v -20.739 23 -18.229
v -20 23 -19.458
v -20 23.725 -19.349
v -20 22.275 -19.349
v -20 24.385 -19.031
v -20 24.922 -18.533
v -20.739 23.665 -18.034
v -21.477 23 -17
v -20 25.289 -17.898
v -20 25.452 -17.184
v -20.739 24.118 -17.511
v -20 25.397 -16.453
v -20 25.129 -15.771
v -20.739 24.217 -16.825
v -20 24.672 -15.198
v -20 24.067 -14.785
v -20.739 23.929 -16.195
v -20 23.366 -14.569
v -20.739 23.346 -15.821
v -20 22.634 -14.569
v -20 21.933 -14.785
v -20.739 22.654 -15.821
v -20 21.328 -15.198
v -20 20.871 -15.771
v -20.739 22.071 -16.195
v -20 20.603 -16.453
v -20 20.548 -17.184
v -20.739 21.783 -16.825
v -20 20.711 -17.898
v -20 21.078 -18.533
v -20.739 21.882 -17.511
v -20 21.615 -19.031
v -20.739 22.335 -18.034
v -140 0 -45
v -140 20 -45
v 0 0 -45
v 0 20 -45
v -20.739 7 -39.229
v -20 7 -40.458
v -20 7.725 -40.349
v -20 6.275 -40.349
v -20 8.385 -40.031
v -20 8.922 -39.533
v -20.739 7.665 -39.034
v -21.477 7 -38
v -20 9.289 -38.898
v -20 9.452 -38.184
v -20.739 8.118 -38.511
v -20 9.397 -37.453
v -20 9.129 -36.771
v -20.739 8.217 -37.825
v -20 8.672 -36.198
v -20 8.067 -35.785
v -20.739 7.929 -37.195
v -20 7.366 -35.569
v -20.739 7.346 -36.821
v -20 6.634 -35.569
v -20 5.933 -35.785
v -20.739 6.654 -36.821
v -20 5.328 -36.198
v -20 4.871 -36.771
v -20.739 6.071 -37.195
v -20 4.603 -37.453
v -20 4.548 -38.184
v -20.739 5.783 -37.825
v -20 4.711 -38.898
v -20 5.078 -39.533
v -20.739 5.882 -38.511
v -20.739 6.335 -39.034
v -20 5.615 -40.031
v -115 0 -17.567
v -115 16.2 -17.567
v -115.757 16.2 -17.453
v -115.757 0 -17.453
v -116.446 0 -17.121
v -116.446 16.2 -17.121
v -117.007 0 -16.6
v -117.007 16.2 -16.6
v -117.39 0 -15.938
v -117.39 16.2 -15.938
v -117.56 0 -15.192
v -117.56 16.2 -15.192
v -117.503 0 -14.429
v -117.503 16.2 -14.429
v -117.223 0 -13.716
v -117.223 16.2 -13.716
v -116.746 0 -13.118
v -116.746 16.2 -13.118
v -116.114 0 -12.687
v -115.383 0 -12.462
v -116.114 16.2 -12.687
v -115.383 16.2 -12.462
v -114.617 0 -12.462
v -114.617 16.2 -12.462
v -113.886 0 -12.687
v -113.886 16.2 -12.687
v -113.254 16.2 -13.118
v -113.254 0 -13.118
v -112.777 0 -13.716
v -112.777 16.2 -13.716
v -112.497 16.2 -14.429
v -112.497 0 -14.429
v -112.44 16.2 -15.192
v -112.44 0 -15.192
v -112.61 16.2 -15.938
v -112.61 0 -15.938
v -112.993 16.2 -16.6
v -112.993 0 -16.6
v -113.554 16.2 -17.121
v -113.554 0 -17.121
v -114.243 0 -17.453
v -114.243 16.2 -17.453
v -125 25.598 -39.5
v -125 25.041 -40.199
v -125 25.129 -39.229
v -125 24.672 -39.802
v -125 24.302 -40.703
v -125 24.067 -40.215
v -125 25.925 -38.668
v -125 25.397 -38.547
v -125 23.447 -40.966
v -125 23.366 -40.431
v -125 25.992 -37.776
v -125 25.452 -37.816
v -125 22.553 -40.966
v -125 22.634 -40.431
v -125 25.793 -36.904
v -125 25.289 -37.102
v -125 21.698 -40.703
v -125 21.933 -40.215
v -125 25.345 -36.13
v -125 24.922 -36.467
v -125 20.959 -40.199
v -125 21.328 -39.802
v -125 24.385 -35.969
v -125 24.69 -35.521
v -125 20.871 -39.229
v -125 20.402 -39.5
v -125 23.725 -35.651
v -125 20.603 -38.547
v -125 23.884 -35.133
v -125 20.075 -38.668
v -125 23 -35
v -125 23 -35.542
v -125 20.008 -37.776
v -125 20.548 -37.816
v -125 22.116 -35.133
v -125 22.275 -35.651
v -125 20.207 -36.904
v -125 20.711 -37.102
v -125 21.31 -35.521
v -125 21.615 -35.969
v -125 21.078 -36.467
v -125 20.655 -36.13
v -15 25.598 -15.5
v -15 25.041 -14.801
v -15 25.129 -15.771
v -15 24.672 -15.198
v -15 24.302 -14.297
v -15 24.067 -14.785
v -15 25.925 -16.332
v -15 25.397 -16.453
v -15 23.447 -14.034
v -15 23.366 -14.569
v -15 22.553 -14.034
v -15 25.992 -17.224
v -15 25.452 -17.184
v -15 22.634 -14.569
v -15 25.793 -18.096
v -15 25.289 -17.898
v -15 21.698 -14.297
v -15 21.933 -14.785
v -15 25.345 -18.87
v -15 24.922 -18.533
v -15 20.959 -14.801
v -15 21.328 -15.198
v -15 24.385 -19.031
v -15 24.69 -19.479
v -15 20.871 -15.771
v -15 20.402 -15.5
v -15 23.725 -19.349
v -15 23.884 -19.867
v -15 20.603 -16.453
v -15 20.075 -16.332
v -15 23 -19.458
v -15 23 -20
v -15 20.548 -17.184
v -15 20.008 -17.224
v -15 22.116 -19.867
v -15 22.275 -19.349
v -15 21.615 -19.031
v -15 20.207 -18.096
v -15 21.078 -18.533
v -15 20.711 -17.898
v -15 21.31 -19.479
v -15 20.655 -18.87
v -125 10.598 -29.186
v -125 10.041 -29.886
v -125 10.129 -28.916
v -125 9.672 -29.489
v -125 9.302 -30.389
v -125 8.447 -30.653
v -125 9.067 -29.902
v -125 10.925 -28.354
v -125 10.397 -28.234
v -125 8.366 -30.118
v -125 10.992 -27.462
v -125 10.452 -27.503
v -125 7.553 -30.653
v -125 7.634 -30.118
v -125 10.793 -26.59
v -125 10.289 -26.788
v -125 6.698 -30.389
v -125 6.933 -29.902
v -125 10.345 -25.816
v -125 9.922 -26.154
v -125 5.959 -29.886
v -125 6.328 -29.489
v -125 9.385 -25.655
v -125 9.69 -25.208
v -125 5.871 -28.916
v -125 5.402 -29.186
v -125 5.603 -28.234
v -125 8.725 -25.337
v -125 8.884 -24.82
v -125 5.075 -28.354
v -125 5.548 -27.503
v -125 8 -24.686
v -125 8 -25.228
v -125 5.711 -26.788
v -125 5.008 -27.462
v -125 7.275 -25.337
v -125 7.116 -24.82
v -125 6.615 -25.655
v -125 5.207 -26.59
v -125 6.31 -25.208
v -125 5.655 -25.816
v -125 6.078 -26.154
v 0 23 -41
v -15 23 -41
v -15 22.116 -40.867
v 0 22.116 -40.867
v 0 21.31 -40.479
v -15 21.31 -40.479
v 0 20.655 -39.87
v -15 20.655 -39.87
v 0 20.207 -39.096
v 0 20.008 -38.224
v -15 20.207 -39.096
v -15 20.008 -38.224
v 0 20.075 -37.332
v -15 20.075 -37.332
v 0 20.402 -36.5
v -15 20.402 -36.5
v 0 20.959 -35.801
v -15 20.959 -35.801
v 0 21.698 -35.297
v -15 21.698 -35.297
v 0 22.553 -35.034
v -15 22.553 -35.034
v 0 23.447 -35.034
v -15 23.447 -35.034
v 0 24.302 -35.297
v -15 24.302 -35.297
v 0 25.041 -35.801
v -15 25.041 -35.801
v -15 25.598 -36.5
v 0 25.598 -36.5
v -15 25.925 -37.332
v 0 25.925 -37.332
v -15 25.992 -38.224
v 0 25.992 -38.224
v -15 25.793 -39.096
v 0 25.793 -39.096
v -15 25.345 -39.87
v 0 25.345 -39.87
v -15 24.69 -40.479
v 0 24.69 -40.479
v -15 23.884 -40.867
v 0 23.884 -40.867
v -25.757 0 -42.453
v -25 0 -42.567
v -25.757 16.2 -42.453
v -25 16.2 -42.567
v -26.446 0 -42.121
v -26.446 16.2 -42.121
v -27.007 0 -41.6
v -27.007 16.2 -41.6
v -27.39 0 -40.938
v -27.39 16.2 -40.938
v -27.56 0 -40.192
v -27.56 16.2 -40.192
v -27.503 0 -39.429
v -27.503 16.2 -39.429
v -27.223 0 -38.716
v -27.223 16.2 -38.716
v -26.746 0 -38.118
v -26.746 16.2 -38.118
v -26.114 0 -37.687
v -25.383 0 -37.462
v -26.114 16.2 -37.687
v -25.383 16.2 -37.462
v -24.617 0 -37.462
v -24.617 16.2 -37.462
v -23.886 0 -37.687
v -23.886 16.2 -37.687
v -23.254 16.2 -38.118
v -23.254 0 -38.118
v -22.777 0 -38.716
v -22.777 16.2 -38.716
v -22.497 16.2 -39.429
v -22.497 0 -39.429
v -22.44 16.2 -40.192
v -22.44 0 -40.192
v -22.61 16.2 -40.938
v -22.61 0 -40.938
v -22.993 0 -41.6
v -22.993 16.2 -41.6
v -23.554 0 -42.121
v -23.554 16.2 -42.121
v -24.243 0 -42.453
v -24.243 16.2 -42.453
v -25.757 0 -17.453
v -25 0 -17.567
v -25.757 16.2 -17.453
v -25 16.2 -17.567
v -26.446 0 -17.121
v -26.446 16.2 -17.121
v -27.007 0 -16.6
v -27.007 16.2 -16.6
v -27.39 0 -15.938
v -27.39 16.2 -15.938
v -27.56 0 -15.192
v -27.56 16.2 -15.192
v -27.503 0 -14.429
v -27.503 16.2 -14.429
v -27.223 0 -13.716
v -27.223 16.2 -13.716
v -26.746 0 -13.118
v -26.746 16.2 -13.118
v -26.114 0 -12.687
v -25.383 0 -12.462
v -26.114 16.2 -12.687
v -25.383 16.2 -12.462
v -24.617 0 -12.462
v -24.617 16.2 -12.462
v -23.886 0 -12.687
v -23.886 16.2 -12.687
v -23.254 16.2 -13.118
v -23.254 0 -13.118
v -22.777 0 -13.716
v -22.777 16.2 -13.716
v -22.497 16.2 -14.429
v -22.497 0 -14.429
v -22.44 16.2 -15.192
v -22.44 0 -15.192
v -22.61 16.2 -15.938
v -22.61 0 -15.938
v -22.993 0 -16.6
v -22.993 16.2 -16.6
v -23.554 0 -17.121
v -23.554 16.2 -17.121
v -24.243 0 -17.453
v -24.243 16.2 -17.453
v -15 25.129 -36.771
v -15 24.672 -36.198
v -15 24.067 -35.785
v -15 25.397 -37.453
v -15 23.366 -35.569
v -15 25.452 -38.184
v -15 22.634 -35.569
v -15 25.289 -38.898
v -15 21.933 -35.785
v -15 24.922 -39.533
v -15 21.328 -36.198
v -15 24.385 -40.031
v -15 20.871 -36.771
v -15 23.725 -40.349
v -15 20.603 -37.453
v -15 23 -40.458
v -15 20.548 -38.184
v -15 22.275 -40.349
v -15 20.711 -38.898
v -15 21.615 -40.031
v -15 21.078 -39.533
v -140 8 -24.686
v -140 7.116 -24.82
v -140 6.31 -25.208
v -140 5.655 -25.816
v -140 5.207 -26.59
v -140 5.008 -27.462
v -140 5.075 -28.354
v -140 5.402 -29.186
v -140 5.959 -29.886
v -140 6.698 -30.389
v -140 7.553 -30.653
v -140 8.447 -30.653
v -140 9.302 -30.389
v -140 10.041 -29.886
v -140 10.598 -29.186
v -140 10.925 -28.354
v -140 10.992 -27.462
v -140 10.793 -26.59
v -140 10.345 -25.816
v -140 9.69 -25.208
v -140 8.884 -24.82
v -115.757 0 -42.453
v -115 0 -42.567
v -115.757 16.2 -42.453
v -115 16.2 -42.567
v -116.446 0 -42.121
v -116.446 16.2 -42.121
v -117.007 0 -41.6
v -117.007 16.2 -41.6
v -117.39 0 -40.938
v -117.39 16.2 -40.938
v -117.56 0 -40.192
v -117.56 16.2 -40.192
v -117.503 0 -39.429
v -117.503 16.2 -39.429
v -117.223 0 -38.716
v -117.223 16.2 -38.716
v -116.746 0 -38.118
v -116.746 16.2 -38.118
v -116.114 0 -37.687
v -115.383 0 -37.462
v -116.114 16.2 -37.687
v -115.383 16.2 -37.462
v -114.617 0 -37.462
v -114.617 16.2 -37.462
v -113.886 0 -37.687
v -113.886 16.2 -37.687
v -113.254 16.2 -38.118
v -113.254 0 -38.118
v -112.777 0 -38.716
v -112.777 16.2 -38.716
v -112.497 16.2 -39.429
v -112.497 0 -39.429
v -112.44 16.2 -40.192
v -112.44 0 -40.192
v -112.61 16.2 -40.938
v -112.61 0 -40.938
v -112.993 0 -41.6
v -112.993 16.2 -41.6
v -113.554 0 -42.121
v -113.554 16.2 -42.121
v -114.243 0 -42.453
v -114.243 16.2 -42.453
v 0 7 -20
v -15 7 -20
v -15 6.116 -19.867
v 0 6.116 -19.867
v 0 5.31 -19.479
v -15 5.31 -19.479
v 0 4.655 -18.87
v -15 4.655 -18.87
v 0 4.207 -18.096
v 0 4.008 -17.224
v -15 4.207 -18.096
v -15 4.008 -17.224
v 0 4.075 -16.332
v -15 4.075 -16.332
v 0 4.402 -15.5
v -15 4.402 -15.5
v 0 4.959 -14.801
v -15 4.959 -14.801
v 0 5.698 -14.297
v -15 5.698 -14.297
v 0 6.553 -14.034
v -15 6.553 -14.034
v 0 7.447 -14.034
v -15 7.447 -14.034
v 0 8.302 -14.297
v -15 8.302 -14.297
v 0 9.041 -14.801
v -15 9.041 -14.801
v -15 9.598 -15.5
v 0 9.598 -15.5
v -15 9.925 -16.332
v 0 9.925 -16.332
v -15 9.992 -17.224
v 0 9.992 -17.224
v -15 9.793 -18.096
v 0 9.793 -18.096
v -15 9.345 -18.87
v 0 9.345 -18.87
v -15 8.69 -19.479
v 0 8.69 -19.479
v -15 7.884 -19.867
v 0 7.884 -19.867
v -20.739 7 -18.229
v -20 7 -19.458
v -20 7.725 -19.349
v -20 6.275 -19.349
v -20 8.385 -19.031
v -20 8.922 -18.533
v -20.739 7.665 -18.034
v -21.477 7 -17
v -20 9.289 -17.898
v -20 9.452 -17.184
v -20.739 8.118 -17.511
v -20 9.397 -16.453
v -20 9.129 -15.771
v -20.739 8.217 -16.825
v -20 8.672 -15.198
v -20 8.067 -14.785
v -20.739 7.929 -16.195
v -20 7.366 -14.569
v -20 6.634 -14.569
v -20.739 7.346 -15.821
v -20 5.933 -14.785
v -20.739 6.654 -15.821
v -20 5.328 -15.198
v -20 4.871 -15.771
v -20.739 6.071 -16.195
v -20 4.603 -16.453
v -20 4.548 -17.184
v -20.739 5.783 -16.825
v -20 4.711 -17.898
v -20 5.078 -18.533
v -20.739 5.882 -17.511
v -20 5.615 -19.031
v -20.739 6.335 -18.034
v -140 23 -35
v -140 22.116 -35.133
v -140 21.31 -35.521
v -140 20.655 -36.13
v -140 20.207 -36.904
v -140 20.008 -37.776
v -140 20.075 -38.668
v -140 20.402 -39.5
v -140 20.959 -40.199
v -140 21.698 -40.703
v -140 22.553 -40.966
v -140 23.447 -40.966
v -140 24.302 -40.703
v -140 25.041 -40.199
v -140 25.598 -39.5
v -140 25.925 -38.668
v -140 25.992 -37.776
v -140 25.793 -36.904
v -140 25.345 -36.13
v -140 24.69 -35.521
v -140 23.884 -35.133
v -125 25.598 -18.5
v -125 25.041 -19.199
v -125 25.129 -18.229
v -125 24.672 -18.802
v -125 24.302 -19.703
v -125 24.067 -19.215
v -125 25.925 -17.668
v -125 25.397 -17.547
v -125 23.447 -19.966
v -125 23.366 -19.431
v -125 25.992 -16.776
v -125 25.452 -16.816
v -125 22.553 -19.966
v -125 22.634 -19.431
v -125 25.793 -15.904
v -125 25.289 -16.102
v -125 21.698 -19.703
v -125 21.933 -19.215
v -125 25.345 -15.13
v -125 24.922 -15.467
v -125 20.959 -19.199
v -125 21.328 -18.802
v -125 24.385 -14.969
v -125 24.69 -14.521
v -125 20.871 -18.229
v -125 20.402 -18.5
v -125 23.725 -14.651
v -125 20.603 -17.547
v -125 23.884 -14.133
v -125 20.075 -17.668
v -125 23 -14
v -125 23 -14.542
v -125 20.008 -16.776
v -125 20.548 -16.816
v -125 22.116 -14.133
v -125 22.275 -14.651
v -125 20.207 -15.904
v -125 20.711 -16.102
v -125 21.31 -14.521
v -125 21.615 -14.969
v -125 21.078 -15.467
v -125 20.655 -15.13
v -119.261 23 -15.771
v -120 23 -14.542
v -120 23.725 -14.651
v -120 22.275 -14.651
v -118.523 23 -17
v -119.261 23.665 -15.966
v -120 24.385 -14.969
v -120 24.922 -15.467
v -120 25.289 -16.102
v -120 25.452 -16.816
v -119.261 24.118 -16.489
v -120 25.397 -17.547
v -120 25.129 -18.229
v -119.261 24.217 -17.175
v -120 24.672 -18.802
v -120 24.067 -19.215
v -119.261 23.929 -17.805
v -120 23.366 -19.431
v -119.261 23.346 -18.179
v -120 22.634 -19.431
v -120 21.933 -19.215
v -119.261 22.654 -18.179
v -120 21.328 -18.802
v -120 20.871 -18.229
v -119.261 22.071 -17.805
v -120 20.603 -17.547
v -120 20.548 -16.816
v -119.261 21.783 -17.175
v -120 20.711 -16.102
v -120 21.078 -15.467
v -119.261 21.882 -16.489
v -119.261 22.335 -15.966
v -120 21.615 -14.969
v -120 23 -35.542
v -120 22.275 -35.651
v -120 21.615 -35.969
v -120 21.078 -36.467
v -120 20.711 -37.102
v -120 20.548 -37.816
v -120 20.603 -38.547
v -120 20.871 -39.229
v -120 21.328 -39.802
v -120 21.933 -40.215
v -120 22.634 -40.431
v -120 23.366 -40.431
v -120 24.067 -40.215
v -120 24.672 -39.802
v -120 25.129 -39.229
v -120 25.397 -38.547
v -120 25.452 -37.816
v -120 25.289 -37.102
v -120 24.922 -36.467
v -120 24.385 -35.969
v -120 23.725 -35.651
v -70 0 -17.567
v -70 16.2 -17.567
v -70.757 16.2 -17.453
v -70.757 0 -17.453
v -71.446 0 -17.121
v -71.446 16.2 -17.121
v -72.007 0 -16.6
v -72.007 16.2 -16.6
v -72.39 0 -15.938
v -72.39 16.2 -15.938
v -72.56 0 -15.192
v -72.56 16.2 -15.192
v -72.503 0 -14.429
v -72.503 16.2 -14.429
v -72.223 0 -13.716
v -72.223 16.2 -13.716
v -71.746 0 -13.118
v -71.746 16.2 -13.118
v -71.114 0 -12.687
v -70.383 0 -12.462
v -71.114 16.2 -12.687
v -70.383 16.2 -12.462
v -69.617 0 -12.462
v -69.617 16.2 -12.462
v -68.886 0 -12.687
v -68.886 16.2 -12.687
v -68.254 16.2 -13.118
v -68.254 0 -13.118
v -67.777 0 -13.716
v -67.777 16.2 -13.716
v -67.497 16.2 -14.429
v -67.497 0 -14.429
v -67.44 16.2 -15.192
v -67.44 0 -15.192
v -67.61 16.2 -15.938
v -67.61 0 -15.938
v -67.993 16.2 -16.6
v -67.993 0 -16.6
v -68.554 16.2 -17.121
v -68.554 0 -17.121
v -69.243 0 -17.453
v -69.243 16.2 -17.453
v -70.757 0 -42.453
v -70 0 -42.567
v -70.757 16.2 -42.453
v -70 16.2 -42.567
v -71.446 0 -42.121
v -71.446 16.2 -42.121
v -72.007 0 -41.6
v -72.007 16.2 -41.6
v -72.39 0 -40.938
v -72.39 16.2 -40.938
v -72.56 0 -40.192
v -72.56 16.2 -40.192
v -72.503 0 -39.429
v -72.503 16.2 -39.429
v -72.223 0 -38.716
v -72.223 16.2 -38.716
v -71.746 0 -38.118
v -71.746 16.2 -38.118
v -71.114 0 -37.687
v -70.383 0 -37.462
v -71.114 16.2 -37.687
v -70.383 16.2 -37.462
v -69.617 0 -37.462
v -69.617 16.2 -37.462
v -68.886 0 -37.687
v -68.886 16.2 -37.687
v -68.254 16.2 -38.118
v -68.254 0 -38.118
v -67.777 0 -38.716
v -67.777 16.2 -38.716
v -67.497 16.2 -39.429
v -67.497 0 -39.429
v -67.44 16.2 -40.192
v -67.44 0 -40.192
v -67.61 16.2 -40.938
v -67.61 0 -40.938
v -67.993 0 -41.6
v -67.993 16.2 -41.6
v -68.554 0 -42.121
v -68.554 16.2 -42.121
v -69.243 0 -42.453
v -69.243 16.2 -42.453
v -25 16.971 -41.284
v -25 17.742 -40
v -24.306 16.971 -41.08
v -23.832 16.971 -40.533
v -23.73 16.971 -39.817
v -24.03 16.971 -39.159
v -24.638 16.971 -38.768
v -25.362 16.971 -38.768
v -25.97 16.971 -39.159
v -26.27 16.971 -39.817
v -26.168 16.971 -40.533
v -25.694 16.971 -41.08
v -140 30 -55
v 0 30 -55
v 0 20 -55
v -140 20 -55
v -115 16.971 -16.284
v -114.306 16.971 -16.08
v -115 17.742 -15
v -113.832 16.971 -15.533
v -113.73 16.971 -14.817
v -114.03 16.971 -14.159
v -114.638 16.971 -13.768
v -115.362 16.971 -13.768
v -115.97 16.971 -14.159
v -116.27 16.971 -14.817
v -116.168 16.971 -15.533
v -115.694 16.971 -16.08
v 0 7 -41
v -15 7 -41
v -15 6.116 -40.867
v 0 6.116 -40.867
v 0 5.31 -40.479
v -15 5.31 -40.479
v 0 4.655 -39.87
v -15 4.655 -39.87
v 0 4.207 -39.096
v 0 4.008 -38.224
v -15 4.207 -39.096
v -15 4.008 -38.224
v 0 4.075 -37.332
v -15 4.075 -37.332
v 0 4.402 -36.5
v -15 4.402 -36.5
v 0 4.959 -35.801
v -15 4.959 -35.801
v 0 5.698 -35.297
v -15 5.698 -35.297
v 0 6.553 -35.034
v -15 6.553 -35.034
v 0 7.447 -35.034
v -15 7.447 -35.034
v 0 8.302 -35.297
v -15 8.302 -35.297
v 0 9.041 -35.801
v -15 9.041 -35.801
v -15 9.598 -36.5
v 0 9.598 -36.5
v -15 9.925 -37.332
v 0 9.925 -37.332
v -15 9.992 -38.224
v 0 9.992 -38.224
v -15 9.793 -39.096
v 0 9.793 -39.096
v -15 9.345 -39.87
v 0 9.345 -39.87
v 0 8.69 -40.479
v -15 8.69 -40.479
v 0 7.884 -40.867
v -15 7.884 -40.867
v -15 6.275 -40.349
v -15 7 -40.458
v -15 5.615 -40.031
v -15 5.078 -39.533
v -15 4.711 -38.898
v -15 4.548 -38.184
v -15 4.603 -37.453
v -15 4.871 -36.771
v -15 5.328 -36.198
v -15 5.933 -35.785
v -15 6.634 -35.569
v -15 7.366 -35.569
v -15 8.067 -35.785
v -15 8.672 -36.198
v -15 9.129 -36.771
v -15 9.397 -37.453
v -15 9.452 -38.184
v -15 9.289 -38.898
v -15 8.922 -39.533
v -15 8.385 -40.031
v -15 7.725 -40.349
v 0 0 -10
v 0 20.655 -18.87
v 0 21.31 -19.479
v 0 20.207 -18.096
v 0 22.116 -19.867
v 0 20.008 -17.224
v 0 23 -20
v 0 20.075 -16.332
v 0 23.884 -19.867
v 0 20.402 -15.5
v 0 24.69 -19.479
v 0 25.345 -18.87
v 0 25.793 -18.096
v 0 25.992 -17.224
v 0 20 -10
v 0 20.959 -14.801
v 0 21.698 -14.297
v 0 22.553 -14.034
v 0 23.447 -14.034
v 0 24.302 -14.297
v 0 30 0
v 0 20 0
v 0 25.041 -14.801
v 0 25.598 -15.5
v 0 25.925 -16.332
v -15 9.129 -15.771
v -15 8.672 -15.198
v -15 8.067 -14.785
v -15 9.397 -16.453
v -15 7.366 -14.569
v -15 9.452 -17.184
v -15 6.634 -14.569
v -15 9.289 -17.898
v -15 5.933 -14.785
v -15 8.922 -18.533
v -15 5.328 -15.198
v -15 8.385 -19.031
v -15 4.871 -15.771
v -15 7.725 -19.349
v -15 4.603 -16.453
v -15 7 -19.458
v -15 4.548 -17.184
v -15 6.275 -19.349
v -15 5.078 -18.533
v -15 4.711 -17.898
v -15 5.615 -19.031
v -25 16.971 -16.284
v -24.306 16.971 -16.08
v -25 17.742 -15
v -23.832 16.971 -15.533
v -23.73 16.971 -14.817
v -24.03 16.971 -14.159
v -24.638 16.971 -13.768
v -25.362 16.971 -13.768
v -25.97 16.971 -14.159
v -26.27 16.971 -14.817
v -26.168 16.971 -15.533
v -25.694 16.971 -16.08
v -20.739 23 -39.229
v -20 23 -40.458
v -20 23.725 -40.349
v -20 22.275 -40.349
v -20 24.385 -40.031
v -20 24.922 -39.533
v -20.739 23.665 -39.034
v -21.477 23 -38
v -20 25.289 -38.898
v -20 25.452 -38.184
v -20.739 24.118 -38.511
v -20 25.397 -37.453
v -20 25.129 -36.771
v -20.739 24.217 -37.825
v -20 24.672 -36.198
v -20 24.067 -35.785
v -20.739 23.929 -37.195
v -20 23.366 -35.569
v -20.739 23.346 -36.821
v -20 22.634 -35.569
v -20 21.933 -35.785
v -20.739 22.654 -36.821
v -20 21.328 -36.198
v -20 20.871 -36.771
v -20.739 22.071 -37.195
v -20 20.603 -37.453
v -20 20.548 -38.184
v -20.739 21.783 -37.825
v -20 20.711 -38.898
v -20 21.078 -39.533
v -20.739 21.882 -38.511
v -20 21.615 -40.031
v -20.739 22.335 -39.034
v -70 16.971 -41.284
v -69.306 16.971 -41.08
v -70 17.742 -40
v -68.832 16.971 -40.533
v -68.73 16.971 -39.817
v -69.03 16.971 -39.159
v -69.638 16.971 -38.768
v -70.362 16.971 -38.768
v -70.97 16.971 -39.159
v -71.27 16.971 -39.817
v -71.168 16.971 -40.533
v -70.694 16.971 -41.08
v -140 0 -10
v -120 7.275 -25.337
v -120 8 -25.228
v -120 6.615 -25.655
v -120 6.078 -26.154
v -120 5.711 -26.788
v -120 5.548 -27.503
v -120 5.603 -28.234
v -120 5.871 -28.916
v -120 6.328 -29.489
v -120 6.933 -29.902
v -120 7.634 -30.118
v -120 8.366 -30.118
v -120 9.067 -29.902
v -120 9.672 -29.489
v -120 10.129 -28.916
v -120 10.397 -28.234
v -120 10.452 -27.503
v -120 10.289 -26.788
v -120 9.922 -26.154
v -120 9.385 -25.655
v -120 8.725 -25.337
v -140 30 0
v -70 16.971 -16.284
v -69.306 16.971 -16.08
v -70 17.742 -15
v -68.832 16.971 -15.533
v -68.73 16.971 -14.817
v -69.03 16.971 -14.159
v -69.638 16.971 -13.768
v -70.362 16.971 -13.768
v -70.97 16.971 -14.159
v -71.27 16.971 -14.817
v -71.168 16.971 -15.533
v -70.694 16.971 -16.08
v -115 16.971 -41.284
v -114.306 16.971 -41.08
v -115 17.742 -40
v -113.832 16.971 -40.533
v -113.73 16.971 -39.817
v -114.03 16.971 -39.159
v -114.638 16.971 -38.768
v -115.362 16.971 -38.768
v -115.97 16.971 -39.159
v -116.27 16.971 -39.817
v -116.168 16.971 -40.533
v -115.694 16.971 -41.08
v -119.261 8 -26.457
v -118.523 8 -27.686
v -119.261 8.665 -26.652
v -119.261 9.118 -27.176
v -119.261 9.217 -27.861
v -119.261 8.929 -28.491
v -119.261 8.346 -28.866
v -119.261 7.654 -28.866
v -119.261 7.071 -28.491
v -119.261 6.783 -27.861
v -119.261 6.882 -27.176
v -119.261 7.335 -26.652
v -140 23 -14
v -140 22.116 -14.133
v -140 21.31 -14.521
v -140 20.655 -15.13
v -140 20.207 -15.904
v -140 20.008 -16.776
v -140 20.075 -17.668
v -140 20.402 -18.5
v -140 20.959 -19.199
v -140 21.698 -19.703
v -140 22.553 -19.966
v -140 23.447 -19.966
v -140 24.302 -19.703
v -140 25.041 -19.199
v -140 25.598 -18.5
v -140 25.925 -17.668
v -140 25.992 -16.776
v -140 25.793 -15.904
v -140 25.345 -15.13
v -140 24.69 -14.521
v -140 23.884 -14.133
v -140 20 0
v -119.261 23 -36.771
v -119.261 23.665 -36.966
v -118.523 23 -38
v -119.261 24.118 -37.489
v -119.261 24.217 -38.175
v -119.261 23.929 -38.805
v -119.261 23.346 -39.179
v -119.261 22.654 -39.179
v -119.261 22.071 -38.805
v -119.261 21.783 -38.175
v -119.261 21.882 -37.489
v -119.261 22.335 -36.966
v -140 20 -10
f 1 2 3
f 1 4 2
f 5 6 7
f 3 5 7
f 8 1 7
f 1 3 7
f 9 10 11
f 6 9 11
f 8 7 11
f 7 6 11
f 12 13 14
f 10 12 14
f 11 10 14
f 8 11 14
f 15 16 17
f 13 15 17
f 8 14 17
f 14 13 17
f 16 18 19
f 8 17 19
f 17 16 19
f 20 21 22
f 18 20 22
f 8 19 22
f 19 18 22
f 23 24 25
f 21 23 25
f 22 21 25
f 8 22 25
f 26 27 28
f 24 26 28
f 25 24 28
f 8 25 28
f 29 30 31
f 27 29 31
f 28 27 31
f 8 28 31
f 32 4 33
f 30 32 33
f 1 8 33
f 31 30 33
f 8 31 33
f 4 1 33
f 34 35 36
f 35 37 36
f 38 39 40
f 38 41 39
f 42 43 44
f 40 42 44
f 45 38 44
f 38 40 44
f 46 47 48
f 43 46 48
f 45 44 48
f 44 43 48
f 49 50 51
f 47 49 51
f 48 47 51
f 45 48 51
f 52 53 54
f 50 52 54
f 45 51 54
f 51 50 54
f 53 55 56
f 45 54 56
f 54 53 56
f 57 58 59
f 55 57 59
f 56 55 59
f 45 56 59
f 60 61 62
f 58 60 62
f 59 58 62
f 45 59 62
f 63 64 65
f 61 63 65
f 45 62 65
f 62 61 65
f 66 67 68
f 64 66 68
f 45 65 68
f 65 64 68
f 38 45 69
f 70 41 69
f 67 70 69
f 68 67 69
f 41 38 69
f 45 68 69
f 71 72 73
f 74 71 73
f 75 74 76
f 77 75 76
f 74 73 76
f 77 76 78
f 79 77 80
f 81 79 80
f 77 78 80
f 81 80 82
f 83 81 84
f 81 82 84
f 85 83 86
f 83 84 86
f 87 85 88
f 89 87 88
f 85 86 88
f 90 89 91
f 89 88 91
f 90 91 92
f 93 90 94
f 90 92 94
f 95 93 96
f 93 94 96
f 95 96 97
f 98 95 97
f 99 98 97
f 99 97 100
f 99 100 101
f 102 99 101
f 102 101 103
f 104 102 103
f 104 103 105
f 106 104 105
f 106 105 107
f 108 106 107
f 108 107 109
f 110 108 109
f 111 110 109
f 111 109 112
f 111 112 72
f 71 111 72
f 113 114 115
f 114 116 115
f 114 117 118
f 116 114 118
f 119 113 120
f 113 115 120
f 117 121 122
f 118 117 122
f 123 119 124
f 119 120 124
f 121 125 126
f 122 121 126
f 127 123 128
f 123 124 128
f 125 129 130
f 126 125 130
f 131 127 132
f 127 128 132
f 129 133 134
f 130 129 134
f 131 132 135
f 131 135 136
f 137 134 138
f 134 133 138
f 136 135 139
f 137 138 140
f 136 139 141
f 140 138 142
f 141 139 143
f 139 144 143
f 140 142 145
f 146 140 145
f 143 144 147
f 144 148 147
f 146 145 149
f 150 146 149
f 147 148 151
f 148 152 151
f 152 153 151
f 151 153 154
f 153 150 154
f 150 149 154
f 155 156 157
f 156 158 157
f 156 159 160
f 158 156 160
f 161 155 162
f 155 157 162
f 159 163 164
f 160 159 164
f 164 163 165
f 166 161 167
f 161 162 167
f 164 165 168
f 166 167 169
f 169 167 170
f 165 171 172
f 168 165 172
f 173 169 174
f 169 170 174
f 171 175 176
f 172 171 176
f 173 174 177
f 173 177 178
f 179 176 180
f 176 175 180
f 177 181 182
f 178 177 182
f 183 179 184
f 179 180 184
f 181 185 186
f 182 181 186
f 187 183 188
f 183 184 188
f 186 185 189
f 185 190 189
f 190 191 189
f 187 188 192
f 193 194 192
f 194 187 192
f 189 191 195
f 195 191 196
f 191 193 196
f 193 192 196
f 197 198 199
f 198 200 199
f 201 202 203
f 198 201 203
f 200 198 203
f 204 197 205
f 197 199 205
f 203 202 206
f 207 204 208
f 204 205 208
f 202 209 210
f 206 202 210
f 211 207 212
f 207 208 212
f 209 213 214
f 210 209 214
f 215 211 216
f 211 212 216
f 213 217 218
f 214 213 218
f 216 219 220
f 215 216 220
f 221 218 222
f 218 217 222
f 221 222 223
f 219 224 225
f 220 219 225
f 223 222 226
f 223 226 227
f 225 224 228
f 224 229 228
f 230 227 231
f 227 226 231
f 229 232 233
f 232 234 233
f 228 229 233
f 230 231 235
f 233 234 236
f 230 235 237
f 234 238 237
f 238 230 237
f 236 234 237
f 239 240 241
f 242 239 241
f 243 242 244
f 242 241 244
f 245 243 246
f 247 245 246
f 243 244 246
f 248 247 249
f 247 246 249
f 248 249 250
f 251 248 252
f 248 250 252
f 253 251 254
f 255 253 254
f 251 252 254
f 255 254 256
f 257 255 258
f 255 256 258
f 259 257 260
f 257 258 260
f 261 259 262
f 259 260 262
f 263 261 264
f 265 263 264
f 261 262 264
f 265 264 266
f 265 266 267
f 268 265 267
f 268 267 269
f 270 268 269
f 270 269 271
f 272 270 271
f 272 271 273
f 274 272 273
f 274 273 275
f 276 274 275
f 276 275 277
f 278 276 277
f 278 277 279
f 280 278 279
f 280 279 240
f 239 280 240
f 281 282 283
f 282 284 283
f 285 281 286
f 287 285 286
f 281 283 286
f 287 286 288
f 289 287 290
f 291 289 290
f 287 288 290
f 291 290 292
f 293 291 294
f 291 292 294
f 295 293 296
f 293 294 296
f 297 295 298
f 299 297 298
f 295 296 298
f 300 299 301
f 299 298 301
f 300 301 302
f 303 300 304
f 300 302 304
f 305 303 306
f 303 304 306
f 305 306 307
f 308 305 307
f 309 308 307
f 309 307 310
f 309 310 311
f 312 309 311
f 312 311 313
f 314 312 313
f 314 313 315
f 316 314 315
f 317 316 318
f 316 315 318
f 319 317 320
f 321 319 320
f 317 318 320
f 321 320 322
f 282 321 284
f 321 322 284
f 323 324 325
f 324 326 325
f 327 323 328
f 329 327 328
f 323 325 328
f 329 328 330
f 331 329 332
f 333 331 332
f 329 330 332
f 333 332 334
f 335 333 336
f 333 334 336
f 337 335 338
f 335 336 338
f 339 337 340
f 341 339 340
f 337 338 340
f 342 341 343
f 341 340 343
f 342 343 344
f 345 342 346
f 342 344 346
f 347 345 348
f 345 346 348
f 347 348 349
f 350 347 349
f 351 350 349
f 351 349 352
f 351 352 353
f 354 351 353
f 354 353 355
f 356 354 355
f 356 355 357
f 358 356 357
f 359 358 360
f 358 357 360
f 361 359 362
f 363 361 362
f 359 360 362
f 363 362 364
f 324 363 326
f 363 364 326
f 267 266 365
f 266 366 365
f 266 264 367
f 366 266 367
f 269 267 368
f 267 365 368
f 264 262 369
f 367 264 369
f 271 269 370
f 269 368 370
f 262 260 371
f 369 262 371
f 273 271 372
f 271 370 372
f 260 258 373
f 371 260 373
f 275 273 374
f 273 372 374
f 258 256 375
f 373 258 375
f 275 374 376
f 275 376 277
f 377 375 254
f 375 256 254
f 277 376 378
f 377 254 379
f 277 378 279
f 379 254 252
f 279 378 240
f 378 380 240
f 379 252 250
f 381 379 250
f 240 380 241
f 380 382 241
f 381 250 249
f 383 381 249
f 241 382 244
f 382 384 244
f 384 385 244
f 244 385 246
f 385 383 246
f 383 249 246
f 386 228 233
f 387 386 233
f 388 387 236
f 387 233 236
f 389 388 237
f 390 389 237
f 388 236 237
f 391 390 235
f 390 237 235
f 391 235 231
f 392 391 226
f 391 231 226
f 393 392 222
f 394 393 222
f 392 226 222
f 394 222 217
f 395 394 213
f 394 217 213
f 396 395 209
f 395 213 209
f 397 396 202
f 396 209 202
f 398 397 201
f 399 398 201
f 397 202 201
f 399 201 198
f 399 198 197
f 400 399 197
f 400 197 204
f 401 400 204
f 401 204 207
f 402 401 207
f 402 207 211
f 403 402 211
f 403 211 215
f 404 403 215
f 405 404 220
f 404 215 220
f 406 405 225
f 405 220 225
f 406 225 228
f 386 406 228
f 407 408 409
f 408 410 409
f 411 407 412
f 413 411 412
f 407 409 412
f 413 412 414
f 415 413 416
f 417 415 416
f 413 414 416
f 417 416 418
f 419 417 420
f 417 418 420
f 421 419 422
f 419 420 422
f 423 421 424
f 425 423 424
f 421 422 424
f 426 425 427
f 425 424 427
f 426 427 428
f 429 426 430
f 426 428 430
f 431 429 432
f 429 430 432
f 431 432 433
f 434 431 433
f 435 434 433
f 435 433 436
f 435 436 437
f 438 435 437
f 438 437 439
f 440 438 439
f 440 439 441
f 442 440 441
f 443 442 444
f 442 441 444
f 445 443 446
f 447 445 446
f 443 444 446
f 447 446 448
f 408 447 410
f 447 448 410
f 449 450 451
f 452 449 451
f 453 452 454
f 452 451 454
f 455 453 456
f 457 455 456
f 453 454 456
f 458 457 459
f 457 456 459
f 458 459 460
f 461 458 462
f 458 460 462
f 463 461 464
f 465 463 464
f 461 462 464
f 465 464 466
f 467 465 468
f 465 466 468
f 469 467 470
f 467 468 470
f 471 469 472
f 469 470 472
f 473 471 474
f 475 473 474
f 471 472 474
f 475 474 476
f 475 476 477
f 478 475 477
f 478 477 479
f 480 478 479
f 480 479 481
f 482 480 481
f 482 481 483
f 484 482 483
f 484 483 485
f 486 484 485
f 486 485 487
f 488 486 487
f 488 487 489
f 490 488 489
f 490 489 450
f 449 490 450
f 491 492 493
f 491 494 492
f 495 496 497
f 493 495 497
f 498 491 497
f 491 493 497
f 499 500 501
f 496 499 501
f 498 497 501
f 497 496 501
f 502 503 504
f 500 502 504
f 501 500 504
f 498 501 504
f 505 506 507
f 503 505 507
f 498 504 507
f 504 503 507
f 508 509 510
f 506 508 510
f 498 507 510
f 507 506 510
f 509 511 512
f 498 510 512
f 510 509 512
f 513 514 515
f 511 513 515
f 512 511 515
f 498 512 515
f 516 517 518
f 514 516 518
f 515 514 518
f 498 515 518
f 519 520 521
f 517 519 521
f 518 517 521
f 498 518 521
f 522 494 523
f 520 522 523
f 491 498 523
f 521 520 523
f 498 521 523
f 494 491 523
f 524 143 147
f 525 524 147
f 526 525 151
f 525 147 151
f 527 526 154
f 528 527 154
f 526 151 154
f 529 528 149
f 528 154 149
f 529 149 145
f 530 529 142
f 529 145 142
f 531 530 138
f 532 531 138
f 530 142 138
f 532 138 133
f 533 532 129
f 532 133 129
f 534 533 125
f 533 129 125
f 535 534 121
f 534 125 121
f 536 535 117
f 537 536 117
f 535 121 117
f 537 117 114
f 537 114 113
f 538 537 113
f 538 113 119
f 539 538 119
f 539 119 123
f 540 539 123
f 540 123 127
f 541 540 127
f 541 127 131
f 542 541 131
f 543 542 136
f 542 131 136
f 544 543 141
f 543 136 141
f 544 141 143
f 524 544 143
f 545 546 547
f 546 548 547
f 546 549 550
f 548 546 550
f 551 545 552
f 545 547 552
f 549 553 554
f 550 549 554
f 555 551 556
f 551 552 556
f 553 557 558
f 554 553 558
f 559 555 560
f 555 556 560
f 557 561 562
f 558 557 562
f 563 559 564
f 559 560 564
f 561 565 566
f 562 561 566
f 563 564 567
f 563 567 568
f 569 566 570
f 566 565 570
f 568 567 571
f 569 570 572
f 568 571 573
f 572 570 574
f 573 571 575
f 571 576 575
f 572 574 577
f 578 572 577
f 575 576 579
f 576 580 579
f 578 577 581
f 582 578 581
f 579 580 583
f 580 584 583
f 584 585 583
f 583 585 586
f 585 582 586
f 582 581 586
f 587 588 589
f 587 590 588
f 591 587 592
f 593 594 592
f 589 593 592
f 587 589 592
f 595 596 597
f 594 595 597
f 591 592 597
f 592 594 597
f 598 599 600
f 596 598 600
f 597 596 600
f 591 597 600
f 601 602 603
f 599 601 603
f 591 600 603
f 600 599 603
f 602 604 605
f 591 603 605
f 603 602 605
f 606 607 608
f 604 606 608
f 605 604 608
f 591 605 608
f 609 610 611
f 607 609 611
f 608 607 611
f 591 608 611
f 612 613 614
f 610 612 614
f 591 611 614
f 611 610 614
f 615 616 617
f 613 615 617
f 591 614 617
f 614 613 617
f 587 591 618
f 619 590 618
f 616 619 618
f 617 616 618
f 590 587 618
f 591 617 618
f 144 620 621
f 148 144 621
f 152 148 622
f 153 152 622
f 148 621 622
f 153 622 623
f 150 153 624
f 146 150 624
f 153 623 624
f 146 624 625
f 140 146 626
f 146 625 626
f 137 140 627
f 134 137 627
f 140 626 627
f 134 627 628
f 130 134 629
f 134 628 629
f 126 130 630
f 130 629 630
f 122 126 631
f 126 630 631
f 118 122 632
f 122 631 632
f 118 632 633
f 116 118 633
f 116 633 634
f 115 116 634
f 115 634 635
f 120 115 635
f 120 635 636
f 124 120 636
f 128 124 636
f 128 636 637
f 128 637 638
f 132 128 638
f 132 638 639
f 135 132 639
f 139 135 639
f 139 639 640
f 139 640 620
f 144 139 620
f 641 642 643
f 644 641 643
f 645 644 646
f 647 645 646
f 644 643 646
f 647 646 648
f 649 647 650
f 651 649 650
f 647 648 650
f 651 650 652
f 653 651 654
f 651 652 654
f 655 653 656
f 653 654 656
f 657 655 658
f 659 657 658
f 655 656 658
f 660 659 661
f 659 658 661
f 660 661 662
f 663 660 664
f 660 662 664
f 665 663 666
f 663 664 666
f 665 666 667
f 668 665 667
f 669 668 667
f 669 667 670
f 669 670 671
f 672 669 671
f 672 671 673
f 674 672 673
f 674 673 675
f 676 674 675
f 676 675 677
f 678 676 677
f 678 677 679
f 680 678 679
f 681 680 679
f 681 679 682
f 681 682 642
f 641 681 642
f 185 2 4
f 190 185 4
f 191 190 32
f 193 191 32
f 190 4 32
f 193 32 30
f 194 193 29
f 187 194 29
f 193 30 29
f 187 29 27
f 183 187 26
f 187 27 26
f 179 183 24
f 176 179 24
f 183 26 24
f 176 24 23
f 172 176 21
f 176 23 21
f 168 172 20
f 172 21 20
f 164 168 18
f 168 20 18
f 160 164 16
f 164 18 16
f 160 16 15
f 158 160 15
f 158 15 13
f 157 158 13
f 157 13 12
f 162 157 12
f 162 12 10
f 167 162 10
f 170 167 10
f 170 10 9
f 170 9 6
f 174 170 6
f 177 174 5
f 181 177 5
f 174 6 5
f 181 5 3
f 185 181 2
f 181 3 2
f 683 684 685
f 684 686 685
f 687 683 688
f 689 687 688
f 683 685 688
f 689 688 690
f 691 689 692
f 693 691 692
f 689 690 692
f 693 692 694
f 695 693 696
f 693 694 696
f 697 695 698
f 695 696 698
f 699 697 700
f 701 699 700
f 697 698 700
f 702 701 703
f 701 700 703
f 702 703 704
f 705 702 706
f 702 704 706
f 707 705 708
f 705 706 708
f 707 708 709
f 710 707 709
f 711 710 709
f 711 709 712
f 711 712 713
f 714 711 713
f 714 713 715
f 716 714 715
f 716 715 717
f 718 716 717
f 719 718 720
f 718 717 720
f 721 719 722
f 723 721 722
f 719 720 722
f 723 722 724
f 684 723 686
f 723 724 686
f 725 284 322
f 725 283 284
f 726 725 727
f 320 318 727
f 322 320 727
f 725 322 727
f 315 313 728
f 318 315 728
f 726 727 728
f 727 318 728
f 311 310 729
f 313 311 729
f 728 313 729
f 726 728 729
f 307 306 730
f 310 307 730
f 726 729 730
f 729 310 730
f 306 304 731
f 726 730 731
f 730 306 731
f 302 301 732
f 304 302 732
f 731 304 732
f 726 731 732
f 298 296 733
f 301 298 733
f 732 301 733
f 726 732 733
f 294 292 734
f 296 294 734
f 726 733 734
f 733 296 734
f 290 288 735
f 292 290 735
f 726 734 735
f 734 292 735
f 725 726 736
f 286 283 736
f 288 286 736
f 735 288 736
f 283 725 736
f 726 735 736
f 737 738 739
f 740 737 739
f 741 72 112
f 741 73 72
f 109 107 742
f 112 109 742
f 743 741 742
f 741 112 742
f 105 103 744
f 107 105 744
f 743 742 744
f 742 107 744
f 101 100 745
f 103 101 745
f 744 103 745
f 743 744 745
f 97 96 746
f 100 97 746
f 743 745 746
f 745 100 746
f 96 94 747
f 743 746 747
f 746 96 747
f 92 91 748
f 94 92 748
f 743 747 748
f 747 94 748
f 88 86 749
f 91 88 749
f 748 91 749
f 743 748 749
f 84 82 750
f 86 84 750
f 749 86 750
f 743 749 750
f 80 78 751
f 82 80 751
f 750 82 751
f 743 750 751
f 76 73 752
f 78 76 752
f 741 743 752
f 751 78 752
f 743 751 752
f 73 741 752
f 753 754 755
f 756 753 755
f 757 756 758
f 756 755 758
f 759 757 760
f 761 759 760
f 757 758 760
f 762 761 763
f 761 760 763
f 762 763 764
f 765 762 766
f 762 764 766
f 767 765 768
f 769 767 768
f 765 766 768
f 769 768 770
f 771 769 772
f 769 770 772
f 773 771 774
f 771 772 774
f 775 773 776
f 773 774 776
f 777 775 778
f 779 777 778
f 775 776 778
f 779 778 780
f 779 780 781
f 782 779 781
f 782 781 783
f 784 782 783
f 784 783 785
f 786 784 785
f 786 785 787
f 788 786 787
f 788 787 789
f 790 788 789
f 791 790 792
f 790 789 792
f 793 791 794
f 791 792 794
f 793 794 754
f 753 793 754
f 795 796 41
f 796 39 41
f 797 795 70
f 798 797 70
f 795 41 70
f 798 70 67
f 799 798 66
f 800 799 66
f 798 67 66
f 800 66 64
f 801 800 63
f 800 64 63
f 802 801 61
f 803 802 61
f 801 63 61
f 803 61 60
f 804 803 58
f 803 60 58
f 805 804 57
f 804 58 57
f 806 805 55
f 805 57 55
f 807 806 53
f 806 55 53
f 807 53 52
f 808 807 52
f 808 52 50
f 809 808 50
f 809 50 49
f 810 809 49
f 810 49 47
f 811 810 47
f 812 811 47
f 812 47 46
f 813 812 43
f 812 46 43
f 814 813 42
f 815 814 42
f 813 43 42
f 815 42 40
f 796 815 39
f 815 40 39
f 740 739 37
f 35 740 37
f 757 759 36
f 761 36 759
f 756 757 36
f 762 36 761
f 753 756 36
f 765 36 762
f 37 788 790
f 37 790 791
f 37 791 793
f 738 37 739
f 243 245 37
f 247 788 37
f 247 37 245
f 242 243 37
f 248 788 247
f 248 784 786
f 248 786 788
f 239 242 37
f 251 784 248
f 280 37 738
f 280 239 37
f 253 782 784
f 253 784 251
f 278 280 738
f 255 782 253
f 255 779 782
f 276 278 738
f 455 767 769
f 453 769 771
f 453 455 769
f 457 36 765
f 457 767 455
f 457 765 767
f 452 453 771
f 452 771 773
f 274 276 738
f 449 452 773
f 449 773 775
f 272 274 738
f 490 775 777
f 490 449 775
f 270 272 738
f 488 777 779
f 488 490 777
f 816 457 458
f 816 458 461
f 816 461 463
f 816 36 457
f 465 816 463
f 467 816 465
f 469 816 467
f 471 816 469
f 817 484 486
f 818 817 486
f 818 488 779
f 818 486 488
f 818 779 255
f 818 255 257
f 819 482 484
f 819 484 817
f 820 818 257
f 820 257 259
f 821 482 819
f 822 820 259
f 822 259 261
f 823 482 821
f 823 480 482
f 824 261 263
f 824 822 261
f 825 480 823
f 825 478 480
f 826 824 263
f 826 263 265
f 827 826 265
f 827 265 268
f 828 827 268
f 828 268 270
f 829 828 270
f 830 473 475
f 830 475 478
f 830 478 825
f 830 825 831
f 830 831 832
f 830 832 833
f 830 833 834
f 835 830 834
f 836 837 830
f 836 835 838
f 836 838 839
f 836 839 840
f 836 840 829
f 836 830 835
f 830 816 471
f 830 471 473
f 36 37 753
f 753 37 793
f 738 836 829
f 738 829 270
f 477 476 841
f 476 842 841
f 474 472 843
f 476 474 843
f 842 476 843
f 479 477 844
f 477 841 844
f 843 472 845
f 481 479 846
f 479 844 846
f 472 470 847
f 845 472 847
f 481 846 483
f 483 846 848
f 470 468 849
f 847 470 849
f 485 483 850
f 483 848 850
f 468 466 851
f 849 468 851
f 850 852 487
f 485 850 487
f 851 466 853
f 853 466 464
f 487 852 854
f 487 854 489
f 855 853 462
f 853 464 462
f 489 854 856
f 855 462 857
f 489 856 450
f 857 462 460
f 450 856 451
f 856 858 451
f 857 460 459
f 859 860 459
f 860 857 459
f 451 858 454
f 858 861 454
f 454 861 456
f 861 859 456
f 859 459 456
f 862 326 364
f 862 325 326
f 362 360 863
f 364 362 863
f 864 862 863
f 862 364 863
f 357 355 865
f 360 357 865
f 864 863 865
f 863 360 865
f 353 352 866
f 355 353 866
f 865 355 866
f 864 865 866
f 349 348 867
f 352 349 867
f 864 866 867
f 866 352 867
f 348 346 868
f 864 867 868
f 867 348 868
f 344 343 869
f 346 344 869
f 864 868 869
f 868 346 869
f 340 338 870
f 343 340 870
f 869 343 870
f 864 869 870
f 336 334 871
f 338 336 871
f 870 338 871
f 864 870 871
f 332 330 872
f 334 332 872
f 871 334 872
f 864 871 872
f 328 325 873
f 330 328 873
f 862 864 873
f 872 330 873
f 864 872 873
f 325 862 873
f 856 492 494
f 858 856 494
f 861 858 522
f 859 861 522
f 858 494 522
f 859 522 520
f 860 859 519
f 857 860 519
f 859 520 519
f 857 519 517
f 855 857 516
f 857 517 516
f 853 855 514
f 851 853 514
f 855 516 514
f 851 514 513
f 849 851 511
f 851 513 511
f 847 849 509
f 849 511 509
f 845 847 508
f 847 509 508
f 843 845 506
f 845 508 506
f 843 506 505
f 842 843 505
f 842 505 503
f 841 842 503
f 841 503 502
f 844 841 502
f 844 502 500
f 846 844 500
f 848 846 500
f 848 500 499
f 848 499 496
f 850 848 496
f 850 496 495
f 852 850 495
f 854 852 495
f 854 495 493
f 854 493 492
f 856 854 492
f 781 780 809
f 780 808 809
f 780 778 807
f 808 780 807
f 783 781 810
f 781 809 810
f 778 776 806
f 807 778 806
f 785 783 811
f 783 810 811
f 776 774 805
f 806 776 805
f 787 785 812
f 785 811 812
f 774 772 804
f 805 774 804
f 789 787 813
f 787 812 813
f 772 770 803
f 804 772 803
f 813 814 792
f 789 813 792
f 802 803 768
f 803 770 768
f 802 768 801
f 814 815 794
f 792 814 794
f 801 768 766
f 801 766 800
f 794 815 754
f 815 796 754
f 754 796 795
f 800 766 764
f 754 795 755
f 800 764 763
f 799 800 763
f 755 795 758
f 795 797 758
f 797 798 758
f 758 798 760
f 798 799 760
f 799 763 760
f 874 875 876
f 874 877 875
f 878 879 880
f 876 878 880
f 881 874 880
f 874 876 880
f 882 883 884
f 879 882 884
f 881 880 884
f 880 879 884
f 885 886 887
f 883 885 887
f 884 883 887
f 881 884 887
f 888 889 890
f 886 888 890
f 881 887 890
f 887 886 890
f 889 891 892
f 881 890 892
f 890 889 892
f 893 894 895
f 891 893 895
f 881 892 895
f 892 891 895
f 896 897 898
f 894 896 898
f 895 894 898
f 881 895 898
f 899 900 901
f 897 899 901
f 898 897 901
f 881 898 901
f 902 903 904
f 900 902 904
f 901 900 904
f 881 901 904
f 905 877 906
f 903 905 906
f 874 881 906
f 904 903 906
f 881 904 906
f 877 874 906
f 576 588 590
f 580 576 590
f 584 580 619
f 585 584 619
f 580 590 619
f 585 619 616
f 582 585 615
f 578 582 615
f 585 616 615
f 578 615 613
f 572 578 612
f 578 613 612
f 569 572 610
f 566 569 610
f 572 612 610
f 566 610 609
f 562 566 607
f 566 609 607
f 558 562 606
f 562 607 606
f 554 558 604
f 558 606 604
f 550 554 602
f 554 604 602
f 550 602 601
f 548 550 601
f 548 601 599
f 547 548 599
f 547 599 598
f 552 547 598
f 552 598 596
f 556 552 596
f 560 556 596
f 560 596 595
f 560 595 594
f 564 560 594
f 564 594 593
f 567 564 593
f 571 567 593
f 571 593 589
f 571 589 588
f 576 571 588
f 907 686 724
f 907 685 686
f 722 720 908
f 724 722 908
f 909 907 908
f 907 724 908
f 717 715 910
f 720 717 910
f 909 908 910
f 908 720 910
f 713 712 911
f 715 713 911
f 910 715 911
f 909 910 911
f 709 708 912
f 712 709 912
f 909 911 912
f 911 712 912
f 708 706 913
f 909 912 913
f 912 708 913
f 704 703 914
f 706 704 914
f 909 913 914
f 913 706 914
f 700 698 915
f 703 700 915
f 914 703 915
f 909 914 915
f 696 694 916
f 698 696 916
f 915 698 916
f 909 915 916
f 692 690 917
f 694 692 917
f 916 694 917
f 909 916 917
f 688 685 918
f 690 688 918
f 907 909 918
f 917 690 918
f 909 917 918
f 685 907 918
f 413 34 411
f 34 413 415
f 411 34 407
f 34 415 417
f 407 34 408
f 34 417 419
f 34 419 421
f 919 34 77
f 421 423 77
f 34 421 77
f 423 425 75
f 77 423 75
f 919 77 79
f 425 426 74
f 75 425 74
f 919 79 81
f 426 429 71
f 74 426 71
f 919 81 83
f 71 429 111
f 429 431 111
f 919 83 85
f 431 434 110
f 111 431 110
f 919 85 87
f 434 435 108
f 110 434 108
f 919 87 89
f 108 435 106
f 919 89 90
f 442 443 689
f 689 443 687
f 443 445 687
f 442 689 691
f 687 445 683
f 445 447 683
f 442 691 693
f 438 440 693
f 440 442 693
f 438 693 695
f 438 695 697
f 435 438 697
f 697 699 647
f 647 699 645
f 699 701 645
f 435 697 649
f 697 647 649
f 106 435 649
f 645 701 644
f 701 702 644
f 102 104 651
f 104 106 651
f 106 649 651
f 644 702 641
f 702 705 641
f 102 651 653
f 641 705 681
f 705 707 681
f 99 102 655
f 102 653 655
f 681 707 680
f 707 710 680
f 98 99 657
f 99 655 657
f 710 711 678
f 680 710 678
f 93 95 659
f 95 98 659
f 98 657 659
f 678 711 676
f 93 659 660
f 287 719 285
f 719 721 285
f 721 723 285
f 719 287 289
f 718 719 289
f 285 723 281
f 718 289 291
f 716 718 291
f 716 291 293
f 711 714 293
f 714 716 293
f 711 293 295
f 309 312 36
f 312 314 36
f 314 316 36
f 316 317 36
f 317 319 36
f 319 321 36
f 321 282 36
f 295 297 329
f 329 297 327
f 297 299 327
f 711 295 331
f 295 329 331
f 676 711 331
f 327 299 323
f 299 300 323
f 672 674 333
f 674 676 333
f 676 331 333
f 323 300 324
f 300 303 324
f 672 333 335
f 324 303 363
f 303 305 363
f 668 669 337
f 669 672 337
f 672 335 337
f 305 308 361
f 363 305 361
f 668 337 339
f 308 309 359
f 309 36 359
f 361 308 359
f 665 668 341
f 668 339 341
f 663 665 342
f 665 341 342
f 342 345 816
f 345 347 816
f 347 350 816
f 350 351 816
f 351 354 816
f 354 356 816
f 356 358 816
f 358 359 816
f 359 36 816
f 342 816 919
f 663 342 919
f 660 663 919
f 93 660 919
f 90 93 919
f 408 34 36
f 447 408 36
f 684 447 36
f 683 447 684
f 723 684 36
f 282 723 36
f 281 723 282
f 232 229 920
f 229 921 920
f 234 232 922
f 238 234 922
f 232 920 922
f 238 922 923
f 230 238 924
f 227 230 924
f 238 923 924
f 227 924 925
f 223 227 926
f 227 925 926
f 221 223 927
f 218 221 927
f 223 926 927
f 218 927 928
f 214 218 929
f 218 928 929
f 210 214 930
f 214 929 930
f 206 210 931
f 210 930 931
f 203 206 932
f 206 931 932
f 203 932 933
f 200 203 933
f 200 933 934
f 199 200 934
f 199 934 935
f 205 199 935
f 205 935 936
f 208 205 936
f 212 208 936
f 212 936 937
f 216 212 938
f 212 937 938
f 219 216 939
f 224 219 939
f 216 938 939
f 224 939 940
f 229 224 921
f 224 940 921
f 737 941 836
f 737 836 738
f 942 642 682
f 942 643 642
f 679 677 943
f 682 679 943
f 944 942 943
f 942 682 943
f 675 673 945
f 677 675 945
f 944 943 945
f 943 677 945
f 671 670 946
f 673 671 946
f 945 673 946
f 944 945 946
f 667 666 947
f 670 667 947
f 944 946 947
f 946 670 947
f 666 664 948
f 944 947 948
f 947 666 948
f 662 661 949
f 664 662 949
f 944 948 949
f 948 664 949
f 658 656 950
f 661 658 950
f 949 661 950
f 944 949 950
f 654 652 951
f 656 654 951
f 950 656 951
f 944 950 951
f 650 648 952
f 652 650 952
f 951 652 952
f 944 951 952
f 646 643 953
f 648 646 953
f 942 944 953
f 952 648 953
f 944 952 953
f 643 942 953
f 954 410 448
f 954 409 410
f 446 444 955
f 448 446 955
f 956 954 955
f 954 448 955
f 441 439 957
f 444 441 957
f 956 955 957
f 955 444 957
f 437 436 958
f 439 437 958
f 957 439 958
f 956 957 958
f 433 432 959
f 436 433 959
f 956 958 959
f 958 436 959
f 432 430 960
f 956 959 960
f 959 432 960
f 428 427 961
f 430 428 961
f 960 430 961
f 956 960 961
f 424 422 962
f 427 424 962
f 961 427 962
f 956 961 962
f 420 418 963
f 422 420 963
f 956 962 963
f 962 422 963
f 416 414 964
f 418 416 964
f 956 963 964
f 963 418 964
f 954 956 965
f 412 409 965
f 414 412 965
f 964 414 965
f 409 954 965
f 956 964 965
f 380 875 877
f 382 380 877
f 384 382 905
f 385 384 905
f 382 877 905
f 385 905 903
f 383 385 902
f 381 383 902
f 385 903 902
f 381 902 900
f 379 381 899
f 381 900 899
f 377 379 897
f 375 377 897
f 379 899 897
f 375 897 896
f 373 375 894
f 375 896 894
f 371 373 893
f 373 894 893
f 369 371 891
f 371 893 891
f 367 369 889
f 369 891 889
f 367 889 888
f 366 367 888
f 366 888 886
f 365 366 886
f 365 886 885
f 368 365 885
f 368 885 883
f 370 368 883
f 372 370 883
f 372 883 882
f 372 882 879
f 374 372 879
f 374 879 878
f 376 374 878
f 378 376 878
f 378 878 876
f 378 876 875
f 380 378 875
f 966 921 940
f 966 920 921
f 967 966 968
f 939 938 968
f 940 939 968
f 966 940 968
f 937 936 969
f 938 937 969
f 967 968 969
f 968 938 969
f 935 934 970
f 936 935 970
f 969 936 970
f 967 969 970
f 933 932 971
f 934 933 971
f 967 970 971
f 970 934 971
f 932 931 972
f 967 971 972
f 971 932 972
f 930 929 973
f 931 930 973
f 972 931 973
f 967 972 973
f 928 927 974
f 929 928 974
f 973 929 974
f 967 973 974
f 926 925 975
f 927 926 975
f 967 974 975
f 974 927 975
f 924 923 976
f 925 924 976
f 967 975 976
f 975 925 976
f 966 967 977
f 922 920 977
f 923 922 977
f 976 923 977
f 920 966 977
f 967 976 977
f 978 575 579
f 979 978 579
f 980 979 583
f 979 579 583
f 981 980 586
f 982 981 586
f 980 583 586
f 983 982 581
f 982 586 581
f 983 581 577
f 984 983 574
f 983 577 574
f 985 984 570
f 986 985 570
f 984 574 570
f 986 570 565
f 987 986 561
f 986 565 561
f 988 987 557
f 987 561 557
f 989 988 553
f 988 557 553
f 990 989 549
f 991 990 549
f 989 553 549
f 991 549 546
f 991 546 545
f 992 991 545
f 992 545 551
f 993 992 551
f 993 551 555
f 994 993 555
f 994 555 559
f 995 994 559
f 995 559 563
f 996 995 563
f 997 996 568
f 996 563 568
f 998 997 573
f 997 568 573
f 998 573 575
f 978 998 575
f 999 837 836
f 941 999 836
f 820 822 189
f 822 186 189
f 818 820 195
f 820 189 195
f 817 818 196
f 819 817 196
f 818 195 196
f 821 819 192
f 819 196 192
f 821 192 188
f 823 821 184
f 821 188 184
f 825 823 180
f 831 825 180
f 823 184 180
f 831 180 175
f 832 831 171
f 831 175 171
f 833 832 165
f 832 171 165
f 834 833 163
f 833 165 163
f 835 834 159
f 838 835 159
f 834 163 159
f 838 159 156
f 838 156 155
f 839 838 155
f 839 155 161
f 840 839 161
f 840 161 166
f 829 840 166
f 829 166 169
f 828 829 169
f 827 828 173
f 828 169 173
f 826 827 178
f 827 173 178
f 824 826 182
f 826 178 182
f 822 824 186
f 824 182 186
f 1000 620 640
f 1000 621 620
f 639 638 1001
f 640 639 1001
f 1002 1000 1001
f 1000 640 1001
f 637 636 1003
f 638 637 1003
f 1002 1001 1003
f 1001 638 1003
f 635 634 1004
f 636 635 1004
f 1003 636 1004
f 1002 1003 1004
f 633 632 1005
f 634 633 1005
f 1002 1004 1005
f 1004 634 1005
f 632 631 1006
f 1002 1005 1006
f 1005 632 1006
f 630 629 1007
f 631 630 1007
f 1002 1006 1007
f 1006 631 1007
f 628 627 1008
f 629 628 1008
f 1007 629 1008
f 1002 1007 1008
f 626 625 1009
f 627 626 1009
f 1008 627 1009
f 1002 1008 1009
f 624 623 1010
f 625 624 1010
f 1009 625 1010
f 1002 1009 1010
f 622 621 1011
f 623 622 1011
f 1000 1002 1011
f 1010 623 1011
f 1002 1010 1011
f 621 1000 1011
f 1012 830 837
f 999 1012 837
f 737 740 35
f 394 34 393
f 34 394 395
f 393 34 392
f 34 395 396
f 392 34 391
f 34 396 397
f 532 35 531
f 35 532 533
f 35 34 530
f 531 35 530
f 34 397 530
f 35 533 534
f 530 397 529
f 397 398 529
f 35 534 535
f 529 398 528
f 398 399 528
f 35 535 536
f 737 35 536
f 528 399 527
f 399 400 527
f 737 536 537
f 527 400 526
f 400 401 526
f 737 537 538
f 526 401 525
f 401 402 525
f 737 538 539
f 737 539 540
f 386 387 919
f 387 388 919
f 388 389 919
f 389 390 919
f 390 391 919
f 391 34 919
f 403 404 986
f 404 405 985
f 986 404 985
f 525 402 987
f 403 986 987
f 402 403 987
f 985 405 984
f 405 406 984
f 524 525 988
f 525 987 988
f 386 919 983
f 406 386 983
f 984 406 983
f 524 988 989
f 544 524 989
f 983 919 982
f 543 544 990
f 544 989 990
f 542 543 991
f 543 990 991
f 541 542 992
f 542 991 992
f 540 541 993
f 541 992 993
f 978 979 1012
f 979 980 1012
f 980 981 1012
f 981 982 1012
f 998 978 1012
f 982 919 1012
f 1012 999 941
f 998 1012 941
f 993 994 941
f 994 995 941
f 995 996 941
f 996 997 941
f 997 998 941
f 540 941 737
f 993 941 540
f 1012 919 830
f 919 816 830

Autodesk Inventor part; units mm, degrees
ref_plane "YZ Plane" through (0, 0, 0) normal (1, 0, 0) x (0, 1, 0)
ref_plane "XZ Plane" through (0, 0, 0) normal (0, 1, 0) x (-1, 0, 0)
ref_plane "XY Plane" through (0, 0, 0) normal (0, 0, 1) x (1, 0, 0)
sketch "Sketch1" plane through (0, 0, 0) normal (1, 0, 0) x (0, 1, 0)
  line L0 (30, 0) -> (30, -55)
  line L1 (30, -55) -> (20, -55)
  line L2 (20, -55) -> (20, -45)
  line L3 (20, -45) -> (0, -45)
  line L4 (0, -45) -> (0, -10)
  line L5 (0, -10) -> (20, -10)
  line L6 (20, -10) -> (20, 0)
  line L7 (20, 0) -> (30, 0)
  point P0 (0, 0)
  dimension "d0" = 55
  dimension "d1" = 10
  dimension "d2" = 10
  dimension "d3" = 20
  dimension "d4" = 35
  dimension "d5" = 20
  dimension "d6" = 10
  dimension "d7" = 30
  dimension "d8" = 0
extrude "Extrusion1" add sketch "Sketch1" against normal blind 140
sketch "Sketch3" plane through (0, 0, 0) normal (1, 0, 0) x (0, 0, -1)
  line L0 (55, 30) -> (0, 30) projected
  line L1 (10, 20) -> (10, 0) projected
  line L2 (45, 0) -> (45, 20) projected
  line L3 (10, 0) -> (45, 0) projected
  point P0 (0, 0)
  point P1 (17, 23)
  point P2 (38, 23)
  point P3 (17, 7)
  point P4 (38, 7)
  dimension "d26" = 7
  dimension "d27" = 7
  dimension "d28" = 7
  dimension "d29" = 7
  dimension "d30" = 7
  dimension "d31" = 7
  dimension "d32" = 7
  dimension "d33" = 7
hole "Hole2" at (0, 23, -17) at (0, 23, -38) at (0, 7, -38) at (0, 7, -17) direction (-1, 0, 0) diameter 4.917 depth 20 tip angle 118 counterbore diameter 6 counterbore depth 15 thread size "M6x1" class "6H" standard "ISO Metric profile"
sketch "Sketch4" plane through (-140, 0, 0) normal (-1, 0, 0) x (0, 0, 1)
  line L0 (-45, 0) -> (-10, 0) projected
  line L1 (-45, 20) -> (-45, 0) projected
  line L2 (-10, 0) -> (-10, 20) projected
  point P0 (0, 0)
  point P1 (-38, 23)
  point P2 (-17, 23)
  point P3 (-27.6865, 8)
  dimension "d41" = 8
  dimension "d42" = 23
  dimension "d43" = 23
  dimension "d44" = 7
  dimension "d45" = 7
hole "Hole3" at (-140, 8, -27.6865) at (-140, 23, -38) at (-140, 23, -17) direction (1, 0, 0) diameter 4.917 depth 20 tip angle 118 counterbore diameter 6 counterbore depth 15 thread size "M6x1" class "6H" standard "ISO Metric profile"
sketch "Sketch5" plane through (0, 0, -45) normal (0, -1, 0) x (1, 0, 0)
  line L0 (0, 35) -> (0, 0) projected
  line L1 (0, 45) -> (-140, 45) projected
  line L2 (0, -10) -> (-140, -10) projected
  point P0 (-115, 30)
  point P1 (-70, 30)
  point P2 (-25, 30)
  point P3 (-115, 5)
  point P4 (-70, 5)
  point P5 (-25, 5)
  dimension "d53" = 25
  dimension "d61" = 25
  dimension "d62" = 15
  dimension "d63" = 15
  dimension "d64" = 15
  dimension "d65" = 15
  dimension "d66" = 15
  dimension "d67" = 15
  dimension "d68" = 45
  dimension "d69" = 45
  dimension "d70" = 45
  dimension "d71" = 45
hole "Hole4" at (-115, 0, -15) at (-70, 0, -15) at (-115, 0, -40) at (-70, 0, -40) at (-25, 0, -40) at (-25, 0, -15) direction (0, 1, 0) diameter 5.134 depth 16.2 tip angle 118 thread size "M6x0.8" class "6H" standard "ISO Metric profile"
properties part number "Fuhrung" material "Steel, Mild"
